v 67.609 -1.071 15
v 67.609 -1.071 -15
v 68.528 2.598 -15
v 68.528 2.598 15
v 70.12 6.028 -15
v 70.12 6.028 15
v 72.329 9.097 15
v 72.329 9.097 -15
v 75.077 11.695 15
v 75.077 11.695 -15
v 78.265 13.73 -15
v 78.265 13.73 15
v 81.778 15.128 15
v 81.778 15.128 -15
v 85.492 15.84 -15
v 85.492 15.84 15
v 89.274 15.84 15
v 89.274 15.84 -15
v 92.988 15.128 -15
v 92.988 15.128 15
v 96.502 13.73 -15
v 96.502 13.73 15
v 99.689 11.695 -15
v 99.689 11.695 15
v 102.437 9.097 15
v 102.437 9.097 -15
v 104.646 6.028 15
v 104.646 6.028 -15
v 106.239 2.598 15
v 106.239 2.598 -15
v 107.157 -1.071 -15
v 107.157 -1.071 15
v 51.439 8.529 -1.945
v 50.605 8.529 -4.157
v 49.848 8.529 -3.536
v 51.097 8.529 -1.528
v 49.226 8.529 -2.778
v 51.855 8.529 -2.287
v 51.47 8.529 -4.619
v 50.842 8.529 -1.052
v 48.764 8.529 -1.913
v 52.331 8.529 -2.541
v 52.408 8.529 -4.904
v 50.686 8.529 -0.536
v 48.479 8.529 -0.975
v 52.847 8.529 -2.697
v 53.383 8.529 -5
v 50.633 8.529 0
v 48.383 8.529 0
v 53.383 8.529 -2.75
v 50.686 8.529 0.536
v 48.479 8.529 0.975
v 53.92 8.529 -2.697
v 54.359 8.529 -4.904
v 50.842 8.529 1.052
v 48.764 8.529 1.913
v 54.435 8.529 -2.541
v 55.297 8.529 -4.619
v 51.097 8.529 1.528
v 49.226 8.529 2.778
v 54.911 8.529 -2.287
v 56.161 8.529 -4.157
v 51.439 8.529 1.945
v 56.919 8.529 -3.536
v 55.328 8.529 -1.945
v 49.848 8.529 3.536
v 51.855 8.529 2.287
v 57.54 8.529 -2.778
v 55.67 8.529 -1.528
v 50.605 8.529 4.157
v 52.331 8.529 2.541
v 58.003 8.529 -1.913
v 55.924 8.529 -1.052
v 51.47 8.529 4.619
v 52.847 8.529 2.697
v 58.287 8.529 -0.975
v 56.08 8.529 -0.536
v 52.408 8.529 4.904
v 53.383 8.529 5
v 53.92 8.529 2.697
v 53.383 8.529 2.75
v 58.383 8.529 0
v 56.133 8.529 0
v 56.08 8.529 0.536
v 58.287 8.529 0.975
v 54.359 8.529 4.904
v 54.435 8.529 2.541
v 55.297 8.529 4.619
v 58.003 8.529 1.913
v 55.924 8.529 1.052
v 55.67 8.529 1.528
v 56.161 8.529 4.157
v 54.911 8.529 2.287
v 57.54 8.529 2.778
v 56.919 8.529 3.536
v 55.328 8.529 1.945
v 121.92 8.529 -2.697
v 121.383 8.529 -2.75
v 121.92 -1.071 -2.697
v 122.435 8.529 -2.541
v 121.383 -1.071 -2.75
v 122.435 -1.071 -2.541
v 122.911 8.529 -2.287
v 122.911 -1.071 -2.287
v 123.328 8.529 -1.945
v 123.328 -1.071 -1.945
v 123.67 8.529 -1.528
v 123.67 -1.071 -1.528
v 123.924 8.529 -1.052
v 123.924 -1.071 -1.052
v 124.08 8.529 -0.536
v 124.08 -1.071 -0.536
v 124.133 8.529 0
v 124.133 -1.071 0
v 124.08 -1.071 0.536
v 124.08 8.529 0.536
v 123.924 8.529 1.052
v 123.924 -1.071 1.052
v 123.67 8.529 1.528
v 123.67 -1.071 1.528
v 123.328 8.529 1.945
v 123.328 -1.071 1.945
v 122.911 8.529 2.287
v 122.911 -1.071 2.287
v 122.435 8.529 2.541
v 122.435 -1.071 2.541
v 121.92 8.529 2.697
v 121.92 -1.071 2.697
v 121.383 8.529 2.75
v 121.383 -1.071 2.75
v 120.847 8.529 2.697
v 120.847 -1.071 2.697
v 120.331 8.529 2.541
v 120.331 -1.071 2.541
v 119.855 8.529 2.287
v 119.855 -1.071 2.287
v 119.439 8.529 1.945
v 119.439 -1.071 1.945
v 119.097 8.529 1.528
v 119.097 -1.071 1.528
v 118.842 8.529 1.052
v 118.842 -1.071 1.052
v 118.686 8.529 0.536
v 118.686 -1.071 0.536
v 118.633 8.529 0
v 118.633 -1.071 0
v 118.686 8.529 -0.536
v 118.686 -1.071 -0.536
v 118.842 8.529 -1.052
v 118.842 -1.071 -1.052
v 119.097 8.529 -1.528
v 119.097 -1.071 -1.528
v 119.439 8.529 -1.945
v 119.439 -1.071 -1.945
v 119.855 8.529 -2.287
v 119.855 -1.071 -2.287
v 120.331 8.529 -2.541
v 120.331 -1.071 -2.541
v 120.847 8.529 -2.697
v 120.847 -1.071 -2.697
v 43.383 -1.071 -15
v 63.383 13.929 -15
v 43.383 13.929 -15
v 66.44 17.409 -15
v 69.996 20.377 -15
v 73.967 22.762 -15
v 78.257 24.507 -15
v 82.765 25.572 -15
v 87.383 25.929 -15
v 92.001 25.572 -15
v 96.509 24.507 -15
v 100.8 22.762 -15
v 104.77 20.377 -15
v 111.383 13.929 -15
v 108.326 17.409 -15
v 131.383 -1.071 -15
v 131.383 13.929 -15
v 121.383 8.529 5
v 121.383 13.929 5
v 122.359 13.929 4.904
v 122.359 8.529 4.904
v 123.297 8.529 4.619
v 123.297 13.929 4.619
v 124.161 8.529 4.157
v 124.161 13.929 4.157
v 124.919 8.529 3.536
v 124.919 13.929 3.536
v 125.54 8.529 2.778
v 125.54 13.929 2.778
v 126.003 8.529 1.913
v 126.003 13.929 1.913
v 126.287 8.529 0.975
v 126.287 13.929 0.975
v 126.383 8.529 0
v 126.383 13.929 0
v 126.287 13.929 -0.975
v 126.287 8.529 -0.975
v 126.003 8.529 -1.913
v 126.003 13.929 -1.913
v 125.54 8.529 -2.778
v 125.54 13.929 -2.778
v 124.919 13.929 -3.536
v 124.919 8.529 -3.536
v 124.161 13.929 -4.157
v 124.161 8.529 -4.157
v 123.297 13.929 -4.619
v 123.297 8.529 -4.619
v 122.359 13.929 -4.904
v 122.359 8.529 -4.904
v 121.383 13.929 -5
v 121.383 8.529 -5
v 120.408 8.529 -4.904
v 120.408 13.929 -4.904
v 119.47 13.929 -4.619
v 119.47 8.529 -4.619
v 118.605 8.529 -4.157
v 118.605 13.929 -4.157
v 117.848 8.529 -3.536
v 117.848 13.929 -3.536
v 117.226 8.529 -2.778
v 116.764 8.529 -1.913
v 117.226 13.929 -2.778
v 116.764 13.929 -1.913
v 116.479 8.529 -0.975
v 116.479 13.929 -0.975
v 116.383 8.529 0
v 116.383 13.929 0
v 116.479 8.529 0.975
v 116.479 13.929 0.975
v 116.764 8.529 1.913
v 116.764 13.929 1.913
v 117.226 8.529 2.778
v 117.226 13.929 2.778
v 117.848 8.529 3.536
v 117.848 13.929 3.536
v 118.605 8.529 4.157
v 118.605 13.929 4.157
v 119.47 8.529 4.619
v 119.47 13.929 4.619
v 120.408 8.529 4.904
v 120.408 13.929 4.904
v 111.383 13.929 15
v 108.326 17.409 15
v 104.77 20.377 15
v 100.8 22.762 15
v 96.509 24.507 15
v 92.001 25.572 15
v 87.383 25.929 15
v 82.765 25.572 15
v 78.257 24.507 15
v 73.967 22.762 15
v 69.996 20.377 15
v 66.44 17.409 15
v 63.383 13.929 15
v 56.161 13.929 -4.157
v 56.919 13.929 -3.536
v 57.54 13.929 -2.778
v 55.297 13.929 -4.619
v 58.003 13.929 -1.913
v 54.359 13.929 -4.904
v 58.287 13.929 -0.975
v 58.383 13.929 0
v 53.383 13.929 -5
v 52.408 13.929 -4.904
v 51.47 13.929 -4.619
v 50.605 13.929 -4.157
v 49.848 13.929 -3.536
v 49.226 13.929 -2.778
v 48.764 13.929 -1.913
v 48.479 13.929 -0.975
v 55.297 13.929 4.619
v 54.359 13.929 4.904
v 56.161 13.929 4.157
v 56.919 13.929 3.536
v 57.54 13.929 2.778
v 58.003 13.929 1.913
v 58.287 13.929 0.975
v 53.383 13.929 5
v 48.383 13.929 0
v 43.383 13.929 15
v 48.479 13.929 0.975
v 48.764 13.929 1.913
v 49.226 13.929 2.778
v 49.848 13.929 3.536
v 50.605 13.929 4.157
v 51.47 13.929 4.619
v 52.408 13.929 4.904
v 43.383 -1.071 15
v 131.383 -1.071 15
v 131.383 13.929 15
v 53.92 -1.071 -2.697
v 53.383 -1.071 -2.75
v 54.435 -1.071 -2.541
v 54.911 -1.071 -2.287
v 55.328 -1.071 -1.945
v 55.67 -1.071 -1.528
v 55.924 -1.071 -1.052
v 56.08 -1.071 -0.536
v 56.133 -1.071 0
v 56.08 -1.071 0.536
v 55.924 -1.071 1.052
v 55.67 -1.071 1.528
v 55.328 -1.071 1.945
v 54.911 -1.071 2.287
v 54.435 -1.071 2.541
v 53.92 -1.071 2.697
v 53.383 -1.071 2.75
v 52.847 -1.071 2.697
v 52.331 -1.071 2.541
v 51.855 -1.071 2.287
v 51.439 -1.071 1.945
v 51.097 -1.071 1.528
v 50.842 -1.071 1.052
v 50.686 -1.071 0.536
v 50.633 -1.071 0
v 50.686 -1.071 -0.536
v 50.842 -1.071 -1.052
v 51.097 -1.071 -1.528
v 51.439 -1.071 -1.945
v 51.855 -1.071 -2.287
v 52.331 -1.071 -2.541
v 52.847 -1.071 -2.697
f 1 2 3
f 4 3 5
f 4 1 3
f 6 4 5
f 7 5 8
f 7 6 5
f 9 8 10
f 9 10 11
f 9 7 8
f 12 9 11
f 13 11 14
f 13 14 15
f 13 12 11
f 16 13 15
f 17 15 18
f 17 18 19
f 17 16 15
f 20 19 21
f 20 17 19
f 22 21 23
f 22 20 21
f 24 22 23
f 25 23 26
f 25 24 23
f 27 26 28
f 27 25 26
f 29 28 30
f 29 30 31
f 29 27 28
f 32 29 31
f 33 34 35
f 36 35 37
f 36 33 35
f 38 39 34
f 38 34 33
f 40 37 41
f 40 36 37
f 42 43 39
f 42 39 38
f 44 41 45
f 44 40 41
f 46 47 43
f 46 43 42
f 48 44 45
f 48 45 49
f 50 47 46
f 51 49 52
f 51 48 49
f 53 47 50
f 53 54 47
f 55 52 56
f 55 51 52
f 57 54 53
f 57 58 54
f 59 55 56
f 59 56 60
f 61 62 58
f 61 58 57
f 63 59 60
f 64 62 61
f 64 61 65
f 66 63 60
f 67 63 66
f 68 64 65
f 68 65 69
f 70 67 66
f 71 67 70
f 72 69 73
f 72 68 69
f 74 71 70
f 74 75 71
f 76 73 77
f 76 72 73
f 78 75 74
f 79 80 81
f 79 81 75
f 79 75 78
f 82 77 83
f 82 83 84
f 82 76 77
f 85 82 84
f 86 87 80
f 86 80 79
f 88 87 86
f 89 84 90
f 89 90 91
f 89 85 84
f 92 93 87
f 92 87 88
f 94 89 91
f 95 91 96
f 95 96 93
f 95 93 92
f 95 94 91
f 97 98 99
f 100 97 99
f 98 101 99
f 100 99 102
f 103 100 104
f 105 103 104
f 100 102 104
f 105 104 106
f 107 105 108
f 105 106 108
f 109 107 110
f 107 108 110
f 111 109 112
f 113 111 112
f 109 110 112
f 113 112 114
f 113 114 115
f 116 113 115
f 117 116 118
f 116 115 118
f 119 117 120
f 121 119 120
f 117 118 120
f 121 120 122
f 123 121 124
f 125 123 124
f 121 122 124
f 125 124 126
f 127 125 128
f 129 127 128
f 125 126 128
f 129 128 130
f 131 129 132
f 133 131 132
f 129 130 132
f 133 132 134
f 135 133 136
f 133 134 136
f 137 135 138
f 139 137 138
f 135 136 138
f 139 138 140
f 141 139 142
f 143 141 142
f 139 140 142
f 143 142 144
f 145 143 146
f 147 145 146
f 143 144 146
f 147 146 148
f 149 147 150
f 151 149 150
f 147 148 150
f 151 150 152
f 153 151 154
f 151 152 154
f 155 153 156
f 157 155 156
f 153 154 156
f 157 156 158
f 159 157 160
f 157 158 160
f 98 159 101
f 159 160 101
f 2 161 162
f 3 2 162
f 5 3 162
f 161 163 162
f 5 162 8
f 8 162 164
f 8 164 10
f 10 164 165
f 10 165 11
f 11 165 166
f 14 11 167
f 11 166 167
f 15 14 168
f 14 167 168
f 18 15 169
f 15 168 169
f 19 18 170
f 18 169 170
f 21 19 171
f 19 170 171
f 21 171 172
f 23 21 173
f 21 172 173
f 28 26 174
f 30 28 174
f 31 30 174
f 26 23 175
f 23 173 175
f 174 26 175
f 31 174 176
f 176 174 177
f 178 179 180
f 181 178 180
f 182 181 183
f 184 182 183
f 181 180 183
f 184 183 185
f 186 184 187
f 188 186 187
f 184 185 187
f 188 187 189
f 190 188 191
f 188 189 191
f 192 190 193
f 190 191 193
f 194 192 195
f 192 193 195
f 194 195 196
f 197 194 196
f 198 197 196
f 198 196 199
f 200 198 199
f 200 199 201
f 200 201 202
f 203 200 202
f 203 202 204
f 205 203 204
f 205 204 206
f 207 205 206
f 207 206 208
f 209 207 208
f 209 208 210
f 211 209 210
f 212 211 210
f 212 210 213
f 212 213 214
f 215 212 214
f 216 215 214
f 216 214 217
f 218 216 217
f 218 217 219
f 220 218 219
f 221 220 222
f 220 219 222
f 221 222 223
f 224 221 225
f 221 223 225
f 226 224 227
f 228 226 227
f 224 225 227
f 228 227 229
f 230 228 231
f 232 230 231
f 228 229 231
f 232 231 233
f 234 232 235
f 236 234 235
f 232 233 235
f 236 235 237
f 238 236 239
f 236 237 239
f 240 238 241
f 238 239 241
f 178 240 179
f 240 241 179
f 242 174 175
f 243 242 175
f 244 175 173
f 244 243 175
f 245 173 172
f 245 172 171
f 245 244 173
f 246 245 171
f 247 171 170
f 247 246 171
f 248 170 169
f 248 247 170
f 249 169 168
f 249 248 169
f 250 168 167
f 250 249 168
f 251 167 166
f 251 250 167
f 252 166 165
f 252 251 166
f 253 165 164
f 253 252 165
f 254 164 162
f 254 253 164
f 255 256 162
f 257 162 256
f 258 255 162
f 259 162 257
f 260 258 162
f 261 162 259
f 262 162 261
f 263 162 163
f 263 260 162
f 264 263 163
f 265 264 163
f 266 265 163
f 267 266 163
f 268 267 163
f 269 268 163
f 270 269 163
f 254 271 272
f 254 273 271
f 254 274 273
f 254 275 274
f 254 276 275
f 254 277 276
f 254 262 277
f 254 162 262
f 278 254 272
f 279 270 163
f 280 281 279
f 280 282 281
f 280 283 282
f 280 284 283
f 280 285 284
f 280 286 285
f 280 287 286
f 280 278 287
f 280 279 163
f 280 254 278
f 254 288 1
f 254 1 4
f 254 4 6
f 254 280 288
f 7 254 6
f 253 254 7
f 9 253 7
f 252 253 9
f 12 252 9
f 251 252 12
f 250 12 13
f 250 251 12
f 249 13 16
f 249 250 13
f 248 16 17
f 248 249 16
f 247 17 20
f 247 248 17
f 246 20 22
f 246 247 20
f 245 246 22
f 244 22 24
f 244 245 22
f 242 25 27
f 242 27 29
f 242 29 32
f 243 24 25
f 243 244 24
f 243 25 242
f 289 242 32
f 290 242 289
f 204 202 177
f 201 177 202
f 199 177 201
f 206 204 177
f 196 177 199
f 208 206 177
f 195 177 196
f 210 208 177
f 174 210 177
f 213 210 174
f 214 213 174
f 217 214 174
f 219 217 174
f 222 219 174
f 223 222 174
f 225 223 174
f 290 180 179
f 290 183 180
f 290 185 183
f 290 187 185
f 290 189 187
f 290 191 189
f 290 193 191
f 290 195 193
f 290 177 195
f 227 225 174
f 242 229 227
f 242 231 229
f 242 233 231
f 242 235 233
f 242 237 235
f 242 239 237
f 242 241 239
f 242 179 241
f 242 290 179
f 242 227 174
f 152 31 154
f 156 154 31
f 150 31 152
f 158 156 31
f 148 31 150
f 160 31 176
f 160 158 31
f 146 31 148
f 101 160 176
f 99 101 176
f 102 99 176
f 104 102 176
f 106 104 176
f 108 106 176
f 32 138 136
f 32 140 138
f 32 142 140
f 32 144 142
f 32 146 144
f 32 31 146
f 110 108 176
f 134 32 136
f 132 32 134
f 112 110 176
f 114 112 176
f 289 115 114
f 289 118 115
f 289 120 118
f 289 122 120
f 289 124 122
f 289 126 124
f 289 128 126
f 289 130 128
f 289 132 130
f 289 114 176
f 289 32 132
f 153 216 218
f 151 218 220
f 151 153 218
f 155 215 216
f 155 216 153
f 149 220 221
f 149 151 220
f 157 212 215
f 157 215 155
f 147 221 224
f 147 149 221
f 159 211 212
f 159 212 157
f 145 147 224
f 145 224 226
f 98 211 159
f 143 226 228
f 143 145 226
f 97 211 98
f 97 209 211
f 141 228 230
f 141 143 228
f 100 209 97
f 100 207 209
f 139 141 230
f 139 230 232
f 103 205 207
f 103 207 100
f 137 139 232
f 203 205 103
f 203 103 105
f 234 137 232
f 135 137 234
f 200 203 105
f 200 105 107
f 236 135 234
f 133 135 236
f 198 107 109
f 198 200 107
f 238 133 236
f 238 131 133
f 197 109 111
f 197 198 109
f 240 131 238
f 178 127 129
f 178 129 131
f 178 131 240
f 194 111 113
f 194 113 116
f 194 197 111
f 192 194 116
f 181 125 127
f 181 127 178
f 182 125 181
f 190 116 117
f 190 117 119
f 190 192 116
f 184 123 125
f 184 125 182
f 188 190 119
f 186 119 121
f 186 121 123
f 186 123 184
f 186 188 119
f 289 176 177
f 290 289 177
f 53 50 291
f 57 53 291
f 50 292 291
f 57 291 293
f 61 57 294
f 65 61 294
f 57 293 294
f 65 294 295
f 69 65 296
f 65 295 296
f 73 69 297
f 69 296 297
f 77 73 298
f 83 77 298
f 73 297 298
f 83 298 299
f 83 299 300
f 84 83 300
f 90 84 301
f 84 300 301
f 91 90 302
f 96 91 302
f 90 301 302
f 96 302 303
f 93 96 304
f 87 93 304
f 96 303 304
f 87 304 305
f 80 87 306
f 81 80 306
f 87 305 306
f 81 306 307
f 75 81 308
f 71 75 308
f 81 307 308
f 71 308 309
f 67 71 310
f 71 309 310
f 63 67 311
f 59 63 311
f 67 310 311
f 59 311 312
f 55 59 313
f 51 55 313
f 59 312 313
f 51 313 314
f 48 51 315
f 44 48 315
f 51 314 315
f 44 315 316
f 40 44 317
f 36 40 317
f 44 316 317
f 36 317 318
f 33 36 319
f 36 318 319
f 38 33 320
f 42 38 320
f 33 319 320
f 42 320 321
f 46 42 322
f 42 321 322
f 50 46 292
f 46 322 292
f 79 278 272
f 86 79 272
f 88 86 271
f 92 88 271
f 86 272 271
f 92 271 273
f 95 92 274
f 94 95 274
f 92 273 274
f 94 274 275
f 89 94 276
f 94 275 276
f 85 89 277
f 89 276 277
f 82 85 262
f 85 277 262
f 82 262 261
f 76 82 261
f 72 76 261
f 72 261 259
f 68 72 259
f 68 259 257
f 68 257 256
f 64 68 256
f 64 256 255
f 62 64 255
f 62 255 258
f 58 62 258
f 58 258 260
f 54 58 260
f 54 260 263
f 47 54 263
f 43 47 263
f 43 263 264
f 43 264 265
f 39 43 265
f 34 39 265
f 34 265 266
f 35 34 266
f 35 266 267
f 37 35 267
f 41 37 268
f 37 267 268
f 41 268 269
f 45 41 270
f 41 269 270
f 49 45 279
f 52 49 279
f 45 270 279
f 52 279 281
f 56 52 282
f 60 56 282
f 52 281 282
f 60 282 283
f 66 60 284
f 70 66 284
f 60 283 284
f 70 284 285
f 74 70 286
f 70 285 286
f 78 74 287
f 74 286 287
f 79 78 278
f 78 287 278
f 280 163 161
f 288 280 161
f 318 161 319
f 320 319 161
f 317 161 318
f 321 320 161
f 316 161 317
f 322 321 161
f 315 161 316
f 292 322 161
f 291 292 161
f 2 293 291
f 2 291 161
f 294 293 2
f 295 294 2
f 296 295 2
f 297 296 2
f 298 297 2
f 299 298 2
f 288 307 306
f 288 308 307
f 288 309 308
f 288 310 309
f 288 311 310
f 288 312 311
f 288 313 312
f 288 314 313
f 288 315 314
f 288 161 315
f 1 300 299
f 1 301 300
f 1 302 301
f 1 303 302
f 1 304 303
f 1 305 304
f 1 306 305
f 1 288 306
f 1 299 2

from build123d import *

# Parameters (mm, degrees)
BOSS_EXTRU_1_DEPTH                                 = 15
CHAMBRAGE_POUR_VIS_T_TE_HEXAGONALE_M51_D           = 5.5
CHAMBRAGE_POUR_VIS_T_TE_HEXAGONALE_M51_CBORE_D     = 10
CHAMBRAGE_POUR_VIS_T_TE_HEXAGONALE_M51_CBORE_DEPTH = 5.4


with BuildPart() as part:
    # Esquisse1 → Boss.-Extru.1 (new, symmetric)
    with BuildSketch(Plane.XY):
        with BuildLine():
            Line((43.383109312, -1.070799618), (67.609389379, -1.070799618))
            ThreePointArc((67.609389379, -1.070799618), (87.383109312, 15.929200382), (107.156829246, -1.070799618))
            Line((107.156829246, -1.070799618), (131.383109312, -1.070799618))
            Line((131.383109312, -1.070799618), (131.383109312, 13.929200382))
            Line((131.383109312, 13.929200382), (111.383109312, 13.929200382))
            ThreePointArc((111.383109312, 13.929200382), (87.383109312, 25.929200382), (63.383109312, 13.929200382))
            Line((63.383109312, 13.929200382), (43.383109312, 13.929200382))
            Line((43.383109312, 13.929200382), (43.383109312, -1.070799618))
        make_face()
    extrude(amount=BOSS_EXTRU_1_DEPTH, both=True)

    # Chambrage pour vis à tête hexagonale M51 (through all)
    with Locations(Plane(origin=(53.383109312, 13.929200382, 0), x_dir=(0, 0, 1), z_dir=(0, 1, 0))):
        with Locations((0, 0), (0, 68)):
            CounterBoreHole(CHAMBRAGE_POUR_VIS_T_TE_HEXAGONALE_M51_D / 2, CHAMBRAGE_POUR_VIS_T_TE_HEXAGONALE_M51_CBORE_D / 2, CHAMBRAGE_POUR_VIS_T_TE_HEXAGONALE_M51_CBORE_DEPTH)


solid = part.part
